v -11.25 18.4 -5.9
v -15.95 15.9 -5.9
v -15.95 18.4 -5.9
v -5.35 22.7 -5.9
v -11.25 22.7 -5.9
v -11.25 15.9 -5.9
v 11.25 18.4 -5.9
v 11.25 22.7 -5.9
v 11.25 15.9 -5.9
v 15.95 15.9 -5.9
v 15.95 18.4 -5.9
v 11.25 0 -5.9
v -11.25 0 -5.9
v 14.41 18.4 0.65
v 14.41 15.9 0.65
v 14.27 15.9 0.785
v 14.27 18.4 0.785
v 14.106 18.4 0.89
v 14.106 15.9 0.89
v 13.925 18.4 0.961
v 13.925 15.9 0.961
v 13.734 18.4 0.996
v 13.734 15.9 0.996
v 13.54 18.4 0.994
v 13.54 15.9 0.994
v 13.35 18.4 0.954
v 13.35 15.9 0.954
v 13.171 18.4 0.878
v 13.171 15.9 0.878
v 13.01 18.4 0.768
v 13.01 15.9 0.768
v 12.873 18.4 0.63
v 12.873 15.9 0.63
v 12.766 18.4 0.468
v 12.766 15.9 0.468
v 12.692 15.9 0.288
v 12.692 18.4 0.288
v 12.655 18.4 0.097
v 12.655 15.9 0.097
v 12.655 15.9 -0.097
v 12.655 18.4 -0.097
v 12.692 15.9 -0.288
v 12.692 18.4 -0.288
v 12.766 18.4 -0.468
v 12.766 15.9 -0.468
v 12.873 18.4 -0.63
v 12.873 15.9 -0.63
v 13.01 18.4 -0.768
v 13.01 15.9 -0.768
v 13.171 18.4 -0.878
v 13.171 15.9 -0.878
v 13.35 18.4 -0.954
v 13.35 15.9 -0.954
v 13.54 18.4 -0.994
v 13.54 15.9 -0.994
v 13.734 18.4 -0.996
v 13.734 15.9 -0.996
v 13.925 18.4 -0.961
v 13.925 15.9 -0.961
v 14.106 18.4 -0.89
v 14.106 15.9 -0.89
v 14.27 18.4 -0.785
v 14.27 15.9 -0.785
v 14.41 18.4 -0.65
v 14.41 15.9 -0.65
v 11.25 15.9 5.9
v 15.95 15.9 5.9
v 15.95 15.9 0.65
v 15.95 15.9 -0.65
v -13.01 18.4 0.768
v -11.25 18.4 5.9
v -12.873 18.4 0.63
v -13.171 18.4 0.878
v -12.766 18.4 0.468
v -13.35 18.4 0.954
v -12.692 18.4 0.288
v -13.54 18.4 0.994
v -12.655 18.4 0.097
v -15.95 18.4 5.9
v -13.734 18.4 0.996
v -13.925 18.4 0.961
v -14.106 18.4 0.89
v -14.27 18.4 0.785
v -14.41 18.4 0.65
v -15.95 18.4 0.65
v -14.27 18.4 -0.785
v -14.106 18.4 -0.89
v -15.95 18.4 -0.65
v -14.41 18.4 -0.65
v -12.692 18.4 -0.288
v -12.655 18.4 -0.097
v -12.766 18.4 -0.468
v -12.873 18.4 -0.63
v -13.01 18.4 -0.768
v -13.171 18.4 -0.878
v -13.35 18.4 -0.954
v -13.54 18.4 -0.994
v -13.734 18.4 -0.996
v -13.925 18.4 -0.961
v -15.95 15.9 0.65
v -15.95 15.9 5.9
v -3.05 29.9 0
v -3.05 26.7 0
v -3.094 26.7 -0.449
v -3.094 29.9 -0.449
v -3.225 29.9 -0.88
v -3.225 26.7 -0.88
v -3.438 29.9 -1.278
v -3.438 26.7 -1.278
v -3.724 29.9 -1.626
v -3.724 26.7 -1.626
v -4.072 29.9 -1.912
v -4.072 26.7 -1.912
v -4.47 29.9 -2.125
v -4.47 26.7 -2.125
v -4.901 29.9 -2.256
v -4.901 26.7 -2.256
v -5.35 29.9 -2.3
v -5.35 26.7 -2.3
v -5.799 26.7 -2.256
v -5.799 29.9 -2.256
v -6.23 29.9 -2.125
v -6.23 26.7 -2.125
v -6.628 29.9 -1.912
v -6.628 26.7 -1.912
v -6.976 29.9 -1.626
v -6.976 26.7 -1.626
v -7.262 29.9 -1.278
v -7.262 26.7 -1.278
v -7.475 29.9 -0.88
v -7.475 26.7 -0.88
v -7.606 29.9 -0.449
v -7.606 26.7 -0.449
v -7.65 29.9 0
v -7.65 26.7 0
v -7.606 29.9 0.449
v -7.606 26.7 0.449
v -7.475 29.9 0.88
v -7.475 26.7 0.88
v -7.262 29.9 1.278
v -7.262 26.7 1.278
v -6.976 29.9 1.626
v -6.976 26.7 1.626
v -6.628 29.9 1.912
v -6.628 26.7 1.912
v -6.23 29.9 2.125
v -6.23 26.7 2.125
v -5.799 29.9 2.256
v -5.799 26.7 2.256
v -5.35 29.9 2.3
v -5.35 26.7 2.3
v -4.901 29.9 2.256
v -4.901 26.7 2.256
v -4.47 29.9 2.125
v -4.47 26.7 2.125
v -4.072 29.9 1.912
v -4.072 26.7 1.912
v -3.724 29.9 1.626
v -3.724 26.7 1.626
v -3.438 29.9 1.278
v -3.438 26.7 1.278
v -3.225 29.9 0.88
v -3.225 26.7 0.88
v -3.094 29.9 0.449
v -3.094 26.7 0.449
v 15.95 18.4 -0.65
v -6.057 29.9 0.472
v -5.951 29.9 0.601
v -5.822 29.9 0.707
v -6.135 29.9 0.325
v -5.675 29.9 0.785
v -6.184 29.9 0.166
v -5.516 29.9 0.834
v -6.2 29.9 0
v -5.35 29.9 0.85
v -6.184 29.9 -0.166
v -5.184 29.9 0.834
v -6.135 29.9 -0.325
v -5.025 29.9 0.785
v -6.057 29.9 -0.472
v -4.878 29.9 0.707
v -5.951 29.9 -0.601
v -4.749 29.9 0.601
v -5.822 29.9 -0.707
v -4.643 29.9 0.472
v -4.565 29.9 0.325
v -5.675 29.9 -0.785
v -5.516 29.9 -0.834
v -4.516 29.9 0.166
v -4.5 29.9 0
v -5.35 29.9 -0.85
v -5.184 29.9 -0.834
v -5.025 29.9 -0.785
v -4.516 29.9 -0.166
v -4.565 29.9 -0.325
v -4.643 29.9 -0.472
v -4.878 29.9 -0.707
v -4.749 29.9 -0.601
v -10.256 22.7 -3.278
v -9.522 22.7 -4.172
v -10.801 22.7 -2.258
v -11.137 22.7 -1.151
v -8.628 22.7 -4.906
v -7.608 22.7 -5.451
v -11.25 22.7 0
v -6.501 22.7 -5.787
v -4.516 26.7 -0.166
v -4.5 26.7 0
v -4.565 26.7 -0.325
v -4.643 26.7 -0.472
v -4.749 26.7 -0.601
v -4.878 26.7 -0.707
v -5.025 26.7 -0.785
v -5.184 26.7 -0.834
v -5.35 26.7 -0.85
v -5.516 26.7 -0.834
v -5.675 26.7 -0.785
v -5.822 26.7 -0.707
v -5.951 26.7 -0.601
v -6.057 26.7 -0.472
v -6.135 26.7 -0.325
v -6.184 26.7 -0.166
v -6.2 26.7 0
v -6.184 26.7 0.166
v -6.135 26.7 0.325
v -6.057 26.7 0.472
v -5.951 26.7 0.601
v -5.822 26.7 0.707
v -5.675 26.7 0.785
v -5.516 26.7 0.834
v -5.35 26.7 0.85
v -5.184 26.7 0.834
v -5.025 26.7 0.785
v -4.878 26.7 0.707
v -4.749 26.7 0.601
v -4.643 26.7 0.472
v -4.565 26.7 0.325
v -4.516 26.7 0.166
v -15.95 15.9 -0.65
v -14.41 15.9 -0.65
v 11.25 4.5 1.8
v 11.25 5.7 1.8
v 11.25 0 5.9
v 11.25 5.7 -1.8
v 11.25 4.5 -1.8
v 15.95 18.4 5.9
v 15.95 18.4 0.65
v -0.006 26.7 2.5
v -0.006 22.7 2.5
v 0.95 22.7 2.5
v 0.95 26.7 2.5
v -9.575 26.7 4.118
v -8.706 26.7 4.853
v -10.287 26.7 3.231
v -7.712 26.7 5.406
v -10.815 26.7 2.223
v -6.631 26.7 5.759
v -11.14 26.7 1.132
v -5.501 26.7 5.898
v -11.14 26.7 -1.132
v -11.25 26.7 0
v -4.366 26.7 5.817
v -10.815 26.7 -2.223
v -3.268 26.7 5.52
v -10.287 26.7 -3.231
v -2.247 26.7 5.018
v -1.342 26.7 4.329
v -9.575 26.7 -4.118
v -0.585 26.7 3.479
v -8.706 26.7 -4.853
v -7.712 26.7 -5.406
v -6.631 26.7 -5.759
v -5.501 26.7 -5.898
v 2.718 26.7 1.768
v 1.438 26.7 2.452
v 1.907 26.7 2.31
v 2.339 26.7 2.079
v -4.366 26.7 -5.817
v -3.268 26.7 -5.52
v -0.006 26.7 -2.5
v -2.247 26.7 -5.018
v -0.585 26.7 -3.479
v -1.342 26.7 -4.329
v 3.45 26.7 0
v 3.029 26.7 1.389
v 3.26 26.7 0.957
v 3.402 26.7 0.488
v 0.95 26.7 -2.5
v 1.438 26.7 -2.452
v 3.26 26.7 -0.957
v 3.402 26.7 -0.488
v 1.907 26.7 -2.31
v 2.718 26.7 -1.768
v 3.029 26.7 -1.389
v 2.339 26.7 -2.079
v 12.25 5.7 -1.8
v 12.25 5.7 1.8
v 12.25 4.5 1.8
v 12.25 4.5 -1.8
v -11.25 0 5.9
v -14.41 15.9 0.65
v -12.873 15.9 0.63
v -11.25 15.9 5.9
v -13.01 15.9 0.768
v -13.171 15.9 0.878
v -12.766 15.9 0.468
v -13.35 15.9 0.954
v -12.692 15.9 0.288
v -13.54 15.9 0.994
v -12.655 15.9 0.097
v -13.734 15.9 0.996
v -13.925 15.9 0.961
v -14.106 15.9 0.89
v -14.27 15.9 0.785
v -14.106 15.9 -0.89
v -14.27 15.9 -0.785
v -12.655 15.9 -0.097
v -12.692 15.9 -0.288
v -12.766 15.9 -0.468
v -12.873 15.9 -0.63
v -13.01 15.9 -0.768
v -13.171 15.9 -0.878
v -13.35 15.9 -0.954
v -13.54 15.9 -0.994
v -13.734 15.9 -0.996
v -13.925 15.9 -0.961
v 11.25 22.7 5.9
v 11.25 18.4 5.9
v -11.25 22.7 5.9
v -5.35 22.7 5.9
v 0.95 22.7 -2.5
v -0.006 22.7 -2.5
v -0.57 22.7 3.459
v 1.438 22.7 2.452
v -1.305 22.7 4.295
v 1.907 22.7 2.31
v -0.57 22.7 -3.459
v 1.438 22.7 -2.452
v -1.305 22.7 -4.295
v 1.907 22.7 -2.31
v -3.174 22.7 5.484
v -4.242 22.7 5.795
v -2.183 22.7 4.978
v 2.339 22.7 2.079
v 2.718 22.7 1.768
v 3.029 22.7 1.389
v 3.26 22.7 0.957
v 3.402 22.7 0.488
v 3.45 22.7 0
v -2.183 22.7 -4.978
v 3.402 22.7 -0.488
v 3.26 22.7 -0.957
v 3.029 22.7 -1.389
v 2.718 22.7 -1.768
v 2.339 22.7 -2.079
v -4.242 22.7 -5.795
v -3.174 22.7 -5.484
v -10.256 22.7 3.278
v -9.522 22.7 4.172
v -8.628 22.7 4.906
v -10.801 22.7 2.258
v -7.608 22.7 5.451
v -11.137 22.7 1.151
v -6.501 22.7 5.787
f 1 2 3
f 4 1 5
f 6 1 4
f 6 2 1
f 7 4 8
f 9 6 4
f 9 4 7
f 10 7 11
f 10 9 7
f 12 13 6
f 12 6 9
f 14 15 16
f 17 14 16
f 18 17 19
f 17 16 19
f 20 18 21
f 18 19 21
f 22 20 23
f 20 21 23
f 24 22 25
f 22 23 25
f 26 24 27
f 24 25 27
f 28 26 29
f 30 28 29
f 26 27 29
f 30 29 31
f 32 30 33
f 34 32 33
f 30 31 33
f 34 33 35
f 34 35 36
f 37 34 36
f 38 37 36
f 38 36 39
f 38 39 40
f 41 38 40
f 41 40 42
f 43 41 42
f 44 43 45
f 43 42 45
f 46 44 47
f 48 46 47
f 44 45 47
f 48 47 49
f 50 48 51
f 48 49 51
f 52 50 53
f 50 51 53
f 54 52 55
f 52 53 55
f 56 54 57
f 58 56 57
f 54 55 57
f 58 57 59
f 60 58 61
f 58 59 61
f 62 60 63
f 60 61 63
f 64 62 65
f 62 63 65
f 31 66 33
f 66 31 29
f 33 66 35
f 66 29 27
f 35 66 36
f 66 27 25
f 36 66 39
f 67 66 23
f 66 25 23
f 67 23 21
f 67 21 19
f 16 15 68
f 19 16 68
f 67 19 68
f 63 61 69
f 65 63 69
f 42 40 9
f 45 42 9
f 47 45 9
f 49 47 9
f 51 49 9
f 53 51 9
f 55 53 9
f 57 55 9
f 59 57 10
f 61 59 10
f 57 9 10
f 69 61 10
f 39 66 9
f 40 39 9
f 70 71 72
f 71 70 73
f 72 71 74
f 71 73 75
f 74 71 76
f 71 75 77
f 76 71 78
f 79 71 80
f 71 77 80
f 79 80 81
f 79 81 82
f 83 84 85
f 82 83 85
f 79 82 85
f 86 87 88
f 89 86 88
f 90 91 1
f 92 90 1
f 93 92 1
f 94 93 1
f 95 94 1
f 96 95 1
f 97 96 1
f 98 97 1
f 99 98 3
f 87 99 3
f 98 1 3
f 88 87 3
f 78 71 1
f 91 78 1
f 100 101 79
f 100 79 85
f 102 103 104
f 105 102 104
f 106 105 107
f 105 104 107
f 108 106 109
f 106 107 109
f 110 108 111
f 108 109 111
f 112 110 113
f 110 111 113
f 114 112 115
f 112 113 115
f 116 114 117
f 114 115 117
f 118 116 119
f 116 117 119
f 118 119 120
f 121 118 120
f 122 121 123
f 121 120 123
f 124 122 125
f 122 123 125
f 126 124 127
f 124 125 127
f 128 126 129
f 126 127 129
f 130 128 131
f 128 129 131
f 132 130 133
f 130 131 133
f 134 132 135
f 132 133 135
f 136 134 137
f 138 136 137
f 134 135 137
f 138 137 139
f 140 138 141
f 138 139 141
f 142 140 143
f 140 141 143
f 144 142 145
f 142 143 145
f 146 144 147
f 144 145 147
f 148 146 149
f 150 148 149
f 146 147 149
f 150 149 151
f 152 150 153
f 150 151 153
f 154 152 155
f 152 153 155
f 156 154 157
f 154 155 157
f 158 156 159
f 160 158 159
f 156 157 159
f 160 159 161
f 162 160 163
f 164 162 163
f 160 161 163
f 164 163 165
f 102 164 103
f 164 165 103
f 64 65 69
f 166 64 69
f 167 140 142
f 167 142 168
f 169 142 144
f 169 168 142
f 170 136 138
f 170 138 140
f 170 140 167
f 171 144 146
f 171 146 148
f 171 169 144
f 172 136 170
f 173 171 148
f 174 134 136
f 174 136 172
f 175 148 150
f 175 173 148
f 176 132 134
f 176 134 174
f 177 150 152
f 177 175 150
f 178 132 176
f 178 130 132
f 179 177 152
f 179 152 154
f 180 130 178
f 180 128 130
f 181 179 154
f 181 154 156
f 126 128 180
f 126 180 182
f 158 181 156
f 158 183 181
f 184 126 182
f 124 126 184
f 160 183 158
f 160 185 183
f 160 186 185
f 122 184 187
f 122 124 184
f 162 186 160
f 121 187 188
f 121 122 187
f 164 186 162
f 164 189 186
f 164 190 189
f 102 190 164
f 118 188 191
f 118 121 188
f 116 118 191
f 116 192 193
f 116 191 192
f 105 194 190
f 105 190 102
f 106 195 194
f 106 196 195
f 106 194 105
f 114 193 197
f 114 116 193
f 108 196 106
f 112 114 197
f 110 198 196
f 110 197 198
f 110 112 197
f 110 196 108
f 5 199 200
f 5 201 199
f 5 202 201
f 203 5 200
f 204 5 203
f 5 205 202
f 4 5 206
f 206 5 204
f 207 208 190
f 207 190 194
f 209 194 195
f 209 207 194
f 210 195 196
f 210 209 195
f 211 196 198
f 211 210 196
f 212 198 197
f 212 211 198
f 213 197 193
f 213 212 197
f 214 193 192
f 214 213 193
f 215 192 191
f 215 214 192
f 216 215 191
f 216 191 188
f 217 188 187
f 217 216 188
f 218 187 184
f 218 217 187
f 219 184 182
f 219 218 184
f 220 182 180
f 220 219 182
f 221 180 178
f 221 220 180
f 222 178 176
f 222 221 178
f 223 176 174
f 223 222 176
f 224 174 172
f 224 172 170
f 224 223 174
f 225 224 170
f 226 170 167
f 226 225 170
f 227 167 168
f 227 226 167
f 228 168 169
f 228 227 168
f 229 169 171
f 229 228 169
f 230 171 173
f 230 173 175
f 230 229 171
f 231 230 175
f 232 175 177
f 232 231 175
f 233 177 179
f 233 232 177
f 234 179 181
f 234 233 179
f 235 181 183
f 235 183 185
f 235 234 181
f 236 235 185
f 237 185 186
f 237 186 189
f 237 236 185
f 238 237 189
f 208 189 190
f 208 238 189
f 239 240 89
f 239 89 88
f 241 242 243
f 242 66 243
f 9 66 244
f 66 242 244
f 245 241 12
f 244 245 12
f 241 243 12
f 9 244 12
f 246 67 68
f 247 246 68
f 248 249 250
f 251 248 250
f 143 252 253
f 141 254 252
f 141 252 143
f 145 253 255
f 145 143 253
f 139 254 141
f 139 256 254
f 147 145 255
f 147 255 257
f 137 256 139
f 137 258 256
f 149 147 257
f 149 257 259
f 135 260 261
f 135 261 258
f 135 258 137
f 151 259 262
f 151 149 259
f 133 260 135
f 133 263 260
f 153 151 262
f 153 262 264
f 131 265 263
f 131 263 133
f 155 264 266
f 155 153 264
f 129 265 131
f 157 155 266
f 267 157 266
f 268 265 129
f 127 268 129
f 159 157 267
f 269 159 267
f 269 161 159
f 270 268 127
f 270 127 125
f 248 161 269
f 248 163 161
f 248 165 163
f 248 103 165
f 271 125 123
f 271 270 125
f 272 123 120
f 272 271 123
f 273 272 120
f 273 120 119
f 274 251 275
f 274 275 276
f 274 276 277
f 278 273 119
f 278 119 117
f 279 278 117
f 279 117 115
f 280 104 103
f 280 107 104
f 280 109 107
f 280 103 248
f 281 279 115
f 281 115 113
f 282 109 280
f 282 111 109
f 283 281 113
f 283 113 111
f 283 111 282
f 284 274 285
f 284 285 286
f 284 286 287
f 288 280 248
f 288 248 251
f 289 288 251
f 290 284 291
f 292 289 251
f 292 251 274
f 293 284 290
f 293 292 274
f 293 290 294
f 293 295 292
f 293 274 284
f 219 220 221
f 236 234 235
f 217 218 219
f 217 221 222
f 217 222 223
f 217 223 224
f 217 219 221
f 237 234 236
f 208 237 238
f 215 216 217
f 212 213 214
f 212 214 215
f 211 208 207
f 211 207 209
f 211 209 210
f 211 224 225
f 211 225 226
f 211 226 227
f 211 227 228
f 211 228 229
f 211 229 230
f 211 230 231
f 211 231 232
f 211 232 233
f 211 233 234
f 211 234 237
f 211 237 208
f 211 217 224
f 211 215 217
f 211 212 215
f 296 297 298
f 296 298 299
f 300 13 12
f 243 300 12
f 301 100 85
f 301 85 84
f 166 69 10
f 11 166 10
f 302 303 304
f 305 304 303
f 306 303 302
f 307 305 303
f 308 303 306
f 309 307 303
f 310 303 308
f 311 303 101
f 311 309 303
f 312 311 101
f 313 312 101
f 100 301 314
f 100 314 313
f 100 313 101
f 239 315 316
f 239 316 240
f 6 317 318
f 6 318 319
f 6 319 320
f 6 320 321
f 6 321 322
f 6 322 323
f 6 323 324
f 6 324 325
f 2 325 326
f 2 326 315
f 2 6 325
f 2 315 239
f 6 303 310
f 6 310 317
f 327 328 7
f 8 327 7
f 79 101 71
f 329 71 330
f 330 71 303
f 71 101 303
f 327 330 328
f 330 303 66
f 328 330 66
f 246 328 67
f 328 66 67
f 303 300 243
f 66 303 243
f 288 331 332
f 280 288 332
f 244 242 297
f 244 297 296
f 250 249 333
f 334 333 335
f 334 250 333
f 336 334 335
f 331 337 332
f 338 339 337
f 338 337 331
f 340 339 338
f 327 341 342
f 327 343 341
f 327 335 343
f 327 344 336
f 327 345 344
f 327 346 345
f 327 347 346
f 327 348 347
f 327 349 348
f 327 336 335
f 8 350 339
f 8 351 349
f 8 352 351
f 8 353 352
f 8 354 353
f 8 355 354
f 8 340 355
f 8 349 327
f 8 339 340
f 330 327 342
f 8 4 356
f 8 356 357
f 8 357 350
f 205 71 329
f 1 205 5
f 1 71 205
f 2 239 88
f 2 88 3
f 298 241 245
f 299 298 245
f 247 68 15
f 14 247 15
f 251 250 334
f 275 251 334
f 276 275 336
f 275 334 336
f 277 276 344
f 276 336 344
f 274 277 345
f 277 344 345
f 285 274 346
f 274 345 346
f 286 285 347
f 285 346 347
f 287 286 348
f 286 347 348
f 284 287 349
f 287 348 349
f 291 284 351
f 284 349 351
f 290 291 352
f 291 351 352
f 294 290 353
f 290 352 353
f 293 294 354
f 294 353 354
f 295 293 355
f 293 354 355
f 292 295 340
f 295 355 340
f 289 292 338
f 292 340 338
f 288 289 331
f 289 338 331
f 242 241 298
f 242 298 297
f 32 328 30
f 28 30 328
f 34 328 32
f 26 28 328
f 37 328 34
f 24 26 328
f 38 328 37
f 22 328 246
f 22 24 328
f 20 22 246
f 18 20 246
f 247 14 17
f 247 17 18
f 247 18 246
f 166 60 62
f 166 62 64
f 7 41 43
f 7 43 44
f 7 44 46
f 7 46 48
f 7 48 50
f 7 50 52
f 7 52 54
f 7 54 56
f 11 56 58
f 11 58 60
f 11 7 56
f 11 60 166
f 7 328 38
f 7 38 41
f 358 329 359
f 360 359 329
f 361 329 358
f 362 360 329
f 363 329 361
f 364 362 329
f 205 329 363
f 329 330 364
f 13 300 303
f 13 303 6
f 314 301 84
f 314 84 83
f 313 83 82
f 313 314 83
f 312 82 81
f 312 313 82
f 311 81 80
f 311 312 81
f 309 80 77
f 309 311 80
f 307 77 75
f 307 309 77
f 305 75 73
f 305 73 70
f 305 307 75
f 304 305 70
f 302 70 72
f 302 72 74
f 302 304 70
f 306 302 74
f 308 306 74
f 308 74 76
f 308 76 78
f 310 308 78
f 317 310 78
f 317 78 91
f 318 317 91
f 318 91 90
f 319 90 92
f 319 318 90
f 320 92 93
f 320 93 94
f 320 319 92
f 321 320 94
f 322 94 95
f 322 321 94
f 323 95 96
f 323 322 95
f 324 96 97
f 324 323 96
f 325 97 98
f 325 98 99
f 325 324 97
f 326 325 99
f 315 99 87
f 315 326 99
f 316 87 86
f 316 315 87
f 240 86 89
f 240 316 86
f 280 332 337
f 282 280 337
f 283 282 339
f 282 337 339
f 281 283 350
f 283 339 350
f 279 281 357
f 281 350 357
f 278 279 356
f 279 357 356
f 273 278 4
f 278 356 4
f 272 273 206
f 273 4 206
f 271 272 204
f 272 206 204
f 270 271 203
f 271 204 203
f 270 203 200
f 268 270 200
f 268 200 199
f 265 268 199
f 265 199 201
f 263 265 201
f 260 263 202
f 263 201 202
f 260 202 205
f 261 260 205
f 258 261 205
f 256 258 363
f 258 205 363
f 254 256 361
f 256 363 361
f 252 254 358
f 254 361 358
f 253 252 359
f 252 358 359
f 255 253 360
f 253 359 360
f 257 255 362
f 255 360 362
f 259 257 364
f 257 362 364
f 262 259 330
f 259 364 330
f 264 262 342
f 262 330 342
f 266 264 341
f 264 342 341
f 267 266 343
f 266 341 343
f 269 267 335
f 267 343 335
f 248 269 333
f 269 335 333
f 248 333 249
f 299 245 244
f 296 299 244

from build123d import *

# Parameters (mm, degrees)
SKETCH1_W           = 22.5
SKETCH1_H           = 11.8
BOSS_EXTRUDE1_DEPTH = 22.7
BOSS_EXTRUDE2_START = 15.9
BOSS_EXTRUDE2_DEPTH = 2.5
BOSS_EXTRUDE3_DEPTH = 4
SKETCH4_R           = 2.3
SKETCH4_R_2         = 0.85
BOSS_EXTRUDE4_DEPTH = 3.2
SKETCH5_W           = 3.6
SKETCH5_H           = 1.2
BOSS_EXTRUDE5_DEPTH = 1


with BuildPart() as part:
    # Sketch1 → Boss-Extrude1 (new body)
    with BuildSketch(Plane(origin=(0, 0, 0), x_dir=(1, 0, 0), z_dir=(0, 1, 0))):
        Rectangle(SKETCH1_W, SKETCH1_H)
    extrude(amount=BOSS_EXTRUDE1_DEPTH)

    # Sketch2 → Boss-Extrude2 (add)
    with BuildSketch(Plane(origin=(0, 0, 0), x_dir=(1, 0, 0), z_dir=(0, 1, 0)).offset(BOSS_EXTRUDE2_START)):
        with BuildLine():
            Line((15.95, 5.9), (11.25, 5.9))
            Line((11.25, 5.9), (11.25, -5.9))
            Line((11.25, -5.9), (15.95, -5.9))
            Line((15.95, -5.9), (15.95, -0.65))
            Line((15.95, -0.65), (14.409934208, -0.65))
            ThreePointArc((14.409934208, -0.65), (12.65, 0), (14.409934208, 0.65))
            Line((14.409934208, 0.65), (15.95, 0.65))
            Line((15.95, 0.65), (15.95, 5.9))
        make_face()
    boss_extrude2 = extrude(amount=BOSS_EXTRUDE2_DEPTH)

    # Mirror1: Boss-Extrude2 across plane
    add(boss_extrude2.mirror(Plane(origin=(0, 0, 0), x_dir=(0, 0, 1), z_dir=(1, 0, 0))))

    # Sketch3 → Boss-Extrude3 (add)
    with BuildSketch(Plane(origin=(0, 22.7, 0), x_dir=(1, 0, 0), z_dir=(0, 1, 0))):
        with BuildLine():
            ThreePointArc((-0.005844314, 2.5), (-11.25, 0), (-0.005844314, -2.5))
            Line((-0.005844314, -2.5), (0.95, -2.5))
            ThreePointArc((0.95, -2.5), (3.45, 0), (0.95, 2.5))
            Line((0.95, 2.5), (-0.005844314, 2.5))
        make_face()
    extrude(amount=BOSS_EXTRUDE3_DEPTH)

    # Sketch4 → Boss-Extrude4 (add)
    with BuildSketch(Plane(origin=(0, 26.7, 0), x_dir=(1, 0, 0), z_dir=(0, 1, 0))):
        with Locations((-5.35, 0)):
            Circle(SKETCH4_R)
        with Locations((-5.35, 0)):
            Circle(SKETCH4_R_2, mode=Mode.SUBTRACT)
    extrude(amount=BOSS_EXTRUDE4_DEPTH)

    # Sketch5 → Boss-Extrude5 (add)
    with BuildSketch(Plane(origin=(11.25, 0, 0), x_dir=(0, 0, -1), z_dir=(1, 0, 0))):
        with Locations((0, 5.1)):
            Rectangle(SKETCH5_W, SKETCH5_H)
    extrude(amount=BOSS_EXTRUDE5_DEPTH)


solid = part.part
